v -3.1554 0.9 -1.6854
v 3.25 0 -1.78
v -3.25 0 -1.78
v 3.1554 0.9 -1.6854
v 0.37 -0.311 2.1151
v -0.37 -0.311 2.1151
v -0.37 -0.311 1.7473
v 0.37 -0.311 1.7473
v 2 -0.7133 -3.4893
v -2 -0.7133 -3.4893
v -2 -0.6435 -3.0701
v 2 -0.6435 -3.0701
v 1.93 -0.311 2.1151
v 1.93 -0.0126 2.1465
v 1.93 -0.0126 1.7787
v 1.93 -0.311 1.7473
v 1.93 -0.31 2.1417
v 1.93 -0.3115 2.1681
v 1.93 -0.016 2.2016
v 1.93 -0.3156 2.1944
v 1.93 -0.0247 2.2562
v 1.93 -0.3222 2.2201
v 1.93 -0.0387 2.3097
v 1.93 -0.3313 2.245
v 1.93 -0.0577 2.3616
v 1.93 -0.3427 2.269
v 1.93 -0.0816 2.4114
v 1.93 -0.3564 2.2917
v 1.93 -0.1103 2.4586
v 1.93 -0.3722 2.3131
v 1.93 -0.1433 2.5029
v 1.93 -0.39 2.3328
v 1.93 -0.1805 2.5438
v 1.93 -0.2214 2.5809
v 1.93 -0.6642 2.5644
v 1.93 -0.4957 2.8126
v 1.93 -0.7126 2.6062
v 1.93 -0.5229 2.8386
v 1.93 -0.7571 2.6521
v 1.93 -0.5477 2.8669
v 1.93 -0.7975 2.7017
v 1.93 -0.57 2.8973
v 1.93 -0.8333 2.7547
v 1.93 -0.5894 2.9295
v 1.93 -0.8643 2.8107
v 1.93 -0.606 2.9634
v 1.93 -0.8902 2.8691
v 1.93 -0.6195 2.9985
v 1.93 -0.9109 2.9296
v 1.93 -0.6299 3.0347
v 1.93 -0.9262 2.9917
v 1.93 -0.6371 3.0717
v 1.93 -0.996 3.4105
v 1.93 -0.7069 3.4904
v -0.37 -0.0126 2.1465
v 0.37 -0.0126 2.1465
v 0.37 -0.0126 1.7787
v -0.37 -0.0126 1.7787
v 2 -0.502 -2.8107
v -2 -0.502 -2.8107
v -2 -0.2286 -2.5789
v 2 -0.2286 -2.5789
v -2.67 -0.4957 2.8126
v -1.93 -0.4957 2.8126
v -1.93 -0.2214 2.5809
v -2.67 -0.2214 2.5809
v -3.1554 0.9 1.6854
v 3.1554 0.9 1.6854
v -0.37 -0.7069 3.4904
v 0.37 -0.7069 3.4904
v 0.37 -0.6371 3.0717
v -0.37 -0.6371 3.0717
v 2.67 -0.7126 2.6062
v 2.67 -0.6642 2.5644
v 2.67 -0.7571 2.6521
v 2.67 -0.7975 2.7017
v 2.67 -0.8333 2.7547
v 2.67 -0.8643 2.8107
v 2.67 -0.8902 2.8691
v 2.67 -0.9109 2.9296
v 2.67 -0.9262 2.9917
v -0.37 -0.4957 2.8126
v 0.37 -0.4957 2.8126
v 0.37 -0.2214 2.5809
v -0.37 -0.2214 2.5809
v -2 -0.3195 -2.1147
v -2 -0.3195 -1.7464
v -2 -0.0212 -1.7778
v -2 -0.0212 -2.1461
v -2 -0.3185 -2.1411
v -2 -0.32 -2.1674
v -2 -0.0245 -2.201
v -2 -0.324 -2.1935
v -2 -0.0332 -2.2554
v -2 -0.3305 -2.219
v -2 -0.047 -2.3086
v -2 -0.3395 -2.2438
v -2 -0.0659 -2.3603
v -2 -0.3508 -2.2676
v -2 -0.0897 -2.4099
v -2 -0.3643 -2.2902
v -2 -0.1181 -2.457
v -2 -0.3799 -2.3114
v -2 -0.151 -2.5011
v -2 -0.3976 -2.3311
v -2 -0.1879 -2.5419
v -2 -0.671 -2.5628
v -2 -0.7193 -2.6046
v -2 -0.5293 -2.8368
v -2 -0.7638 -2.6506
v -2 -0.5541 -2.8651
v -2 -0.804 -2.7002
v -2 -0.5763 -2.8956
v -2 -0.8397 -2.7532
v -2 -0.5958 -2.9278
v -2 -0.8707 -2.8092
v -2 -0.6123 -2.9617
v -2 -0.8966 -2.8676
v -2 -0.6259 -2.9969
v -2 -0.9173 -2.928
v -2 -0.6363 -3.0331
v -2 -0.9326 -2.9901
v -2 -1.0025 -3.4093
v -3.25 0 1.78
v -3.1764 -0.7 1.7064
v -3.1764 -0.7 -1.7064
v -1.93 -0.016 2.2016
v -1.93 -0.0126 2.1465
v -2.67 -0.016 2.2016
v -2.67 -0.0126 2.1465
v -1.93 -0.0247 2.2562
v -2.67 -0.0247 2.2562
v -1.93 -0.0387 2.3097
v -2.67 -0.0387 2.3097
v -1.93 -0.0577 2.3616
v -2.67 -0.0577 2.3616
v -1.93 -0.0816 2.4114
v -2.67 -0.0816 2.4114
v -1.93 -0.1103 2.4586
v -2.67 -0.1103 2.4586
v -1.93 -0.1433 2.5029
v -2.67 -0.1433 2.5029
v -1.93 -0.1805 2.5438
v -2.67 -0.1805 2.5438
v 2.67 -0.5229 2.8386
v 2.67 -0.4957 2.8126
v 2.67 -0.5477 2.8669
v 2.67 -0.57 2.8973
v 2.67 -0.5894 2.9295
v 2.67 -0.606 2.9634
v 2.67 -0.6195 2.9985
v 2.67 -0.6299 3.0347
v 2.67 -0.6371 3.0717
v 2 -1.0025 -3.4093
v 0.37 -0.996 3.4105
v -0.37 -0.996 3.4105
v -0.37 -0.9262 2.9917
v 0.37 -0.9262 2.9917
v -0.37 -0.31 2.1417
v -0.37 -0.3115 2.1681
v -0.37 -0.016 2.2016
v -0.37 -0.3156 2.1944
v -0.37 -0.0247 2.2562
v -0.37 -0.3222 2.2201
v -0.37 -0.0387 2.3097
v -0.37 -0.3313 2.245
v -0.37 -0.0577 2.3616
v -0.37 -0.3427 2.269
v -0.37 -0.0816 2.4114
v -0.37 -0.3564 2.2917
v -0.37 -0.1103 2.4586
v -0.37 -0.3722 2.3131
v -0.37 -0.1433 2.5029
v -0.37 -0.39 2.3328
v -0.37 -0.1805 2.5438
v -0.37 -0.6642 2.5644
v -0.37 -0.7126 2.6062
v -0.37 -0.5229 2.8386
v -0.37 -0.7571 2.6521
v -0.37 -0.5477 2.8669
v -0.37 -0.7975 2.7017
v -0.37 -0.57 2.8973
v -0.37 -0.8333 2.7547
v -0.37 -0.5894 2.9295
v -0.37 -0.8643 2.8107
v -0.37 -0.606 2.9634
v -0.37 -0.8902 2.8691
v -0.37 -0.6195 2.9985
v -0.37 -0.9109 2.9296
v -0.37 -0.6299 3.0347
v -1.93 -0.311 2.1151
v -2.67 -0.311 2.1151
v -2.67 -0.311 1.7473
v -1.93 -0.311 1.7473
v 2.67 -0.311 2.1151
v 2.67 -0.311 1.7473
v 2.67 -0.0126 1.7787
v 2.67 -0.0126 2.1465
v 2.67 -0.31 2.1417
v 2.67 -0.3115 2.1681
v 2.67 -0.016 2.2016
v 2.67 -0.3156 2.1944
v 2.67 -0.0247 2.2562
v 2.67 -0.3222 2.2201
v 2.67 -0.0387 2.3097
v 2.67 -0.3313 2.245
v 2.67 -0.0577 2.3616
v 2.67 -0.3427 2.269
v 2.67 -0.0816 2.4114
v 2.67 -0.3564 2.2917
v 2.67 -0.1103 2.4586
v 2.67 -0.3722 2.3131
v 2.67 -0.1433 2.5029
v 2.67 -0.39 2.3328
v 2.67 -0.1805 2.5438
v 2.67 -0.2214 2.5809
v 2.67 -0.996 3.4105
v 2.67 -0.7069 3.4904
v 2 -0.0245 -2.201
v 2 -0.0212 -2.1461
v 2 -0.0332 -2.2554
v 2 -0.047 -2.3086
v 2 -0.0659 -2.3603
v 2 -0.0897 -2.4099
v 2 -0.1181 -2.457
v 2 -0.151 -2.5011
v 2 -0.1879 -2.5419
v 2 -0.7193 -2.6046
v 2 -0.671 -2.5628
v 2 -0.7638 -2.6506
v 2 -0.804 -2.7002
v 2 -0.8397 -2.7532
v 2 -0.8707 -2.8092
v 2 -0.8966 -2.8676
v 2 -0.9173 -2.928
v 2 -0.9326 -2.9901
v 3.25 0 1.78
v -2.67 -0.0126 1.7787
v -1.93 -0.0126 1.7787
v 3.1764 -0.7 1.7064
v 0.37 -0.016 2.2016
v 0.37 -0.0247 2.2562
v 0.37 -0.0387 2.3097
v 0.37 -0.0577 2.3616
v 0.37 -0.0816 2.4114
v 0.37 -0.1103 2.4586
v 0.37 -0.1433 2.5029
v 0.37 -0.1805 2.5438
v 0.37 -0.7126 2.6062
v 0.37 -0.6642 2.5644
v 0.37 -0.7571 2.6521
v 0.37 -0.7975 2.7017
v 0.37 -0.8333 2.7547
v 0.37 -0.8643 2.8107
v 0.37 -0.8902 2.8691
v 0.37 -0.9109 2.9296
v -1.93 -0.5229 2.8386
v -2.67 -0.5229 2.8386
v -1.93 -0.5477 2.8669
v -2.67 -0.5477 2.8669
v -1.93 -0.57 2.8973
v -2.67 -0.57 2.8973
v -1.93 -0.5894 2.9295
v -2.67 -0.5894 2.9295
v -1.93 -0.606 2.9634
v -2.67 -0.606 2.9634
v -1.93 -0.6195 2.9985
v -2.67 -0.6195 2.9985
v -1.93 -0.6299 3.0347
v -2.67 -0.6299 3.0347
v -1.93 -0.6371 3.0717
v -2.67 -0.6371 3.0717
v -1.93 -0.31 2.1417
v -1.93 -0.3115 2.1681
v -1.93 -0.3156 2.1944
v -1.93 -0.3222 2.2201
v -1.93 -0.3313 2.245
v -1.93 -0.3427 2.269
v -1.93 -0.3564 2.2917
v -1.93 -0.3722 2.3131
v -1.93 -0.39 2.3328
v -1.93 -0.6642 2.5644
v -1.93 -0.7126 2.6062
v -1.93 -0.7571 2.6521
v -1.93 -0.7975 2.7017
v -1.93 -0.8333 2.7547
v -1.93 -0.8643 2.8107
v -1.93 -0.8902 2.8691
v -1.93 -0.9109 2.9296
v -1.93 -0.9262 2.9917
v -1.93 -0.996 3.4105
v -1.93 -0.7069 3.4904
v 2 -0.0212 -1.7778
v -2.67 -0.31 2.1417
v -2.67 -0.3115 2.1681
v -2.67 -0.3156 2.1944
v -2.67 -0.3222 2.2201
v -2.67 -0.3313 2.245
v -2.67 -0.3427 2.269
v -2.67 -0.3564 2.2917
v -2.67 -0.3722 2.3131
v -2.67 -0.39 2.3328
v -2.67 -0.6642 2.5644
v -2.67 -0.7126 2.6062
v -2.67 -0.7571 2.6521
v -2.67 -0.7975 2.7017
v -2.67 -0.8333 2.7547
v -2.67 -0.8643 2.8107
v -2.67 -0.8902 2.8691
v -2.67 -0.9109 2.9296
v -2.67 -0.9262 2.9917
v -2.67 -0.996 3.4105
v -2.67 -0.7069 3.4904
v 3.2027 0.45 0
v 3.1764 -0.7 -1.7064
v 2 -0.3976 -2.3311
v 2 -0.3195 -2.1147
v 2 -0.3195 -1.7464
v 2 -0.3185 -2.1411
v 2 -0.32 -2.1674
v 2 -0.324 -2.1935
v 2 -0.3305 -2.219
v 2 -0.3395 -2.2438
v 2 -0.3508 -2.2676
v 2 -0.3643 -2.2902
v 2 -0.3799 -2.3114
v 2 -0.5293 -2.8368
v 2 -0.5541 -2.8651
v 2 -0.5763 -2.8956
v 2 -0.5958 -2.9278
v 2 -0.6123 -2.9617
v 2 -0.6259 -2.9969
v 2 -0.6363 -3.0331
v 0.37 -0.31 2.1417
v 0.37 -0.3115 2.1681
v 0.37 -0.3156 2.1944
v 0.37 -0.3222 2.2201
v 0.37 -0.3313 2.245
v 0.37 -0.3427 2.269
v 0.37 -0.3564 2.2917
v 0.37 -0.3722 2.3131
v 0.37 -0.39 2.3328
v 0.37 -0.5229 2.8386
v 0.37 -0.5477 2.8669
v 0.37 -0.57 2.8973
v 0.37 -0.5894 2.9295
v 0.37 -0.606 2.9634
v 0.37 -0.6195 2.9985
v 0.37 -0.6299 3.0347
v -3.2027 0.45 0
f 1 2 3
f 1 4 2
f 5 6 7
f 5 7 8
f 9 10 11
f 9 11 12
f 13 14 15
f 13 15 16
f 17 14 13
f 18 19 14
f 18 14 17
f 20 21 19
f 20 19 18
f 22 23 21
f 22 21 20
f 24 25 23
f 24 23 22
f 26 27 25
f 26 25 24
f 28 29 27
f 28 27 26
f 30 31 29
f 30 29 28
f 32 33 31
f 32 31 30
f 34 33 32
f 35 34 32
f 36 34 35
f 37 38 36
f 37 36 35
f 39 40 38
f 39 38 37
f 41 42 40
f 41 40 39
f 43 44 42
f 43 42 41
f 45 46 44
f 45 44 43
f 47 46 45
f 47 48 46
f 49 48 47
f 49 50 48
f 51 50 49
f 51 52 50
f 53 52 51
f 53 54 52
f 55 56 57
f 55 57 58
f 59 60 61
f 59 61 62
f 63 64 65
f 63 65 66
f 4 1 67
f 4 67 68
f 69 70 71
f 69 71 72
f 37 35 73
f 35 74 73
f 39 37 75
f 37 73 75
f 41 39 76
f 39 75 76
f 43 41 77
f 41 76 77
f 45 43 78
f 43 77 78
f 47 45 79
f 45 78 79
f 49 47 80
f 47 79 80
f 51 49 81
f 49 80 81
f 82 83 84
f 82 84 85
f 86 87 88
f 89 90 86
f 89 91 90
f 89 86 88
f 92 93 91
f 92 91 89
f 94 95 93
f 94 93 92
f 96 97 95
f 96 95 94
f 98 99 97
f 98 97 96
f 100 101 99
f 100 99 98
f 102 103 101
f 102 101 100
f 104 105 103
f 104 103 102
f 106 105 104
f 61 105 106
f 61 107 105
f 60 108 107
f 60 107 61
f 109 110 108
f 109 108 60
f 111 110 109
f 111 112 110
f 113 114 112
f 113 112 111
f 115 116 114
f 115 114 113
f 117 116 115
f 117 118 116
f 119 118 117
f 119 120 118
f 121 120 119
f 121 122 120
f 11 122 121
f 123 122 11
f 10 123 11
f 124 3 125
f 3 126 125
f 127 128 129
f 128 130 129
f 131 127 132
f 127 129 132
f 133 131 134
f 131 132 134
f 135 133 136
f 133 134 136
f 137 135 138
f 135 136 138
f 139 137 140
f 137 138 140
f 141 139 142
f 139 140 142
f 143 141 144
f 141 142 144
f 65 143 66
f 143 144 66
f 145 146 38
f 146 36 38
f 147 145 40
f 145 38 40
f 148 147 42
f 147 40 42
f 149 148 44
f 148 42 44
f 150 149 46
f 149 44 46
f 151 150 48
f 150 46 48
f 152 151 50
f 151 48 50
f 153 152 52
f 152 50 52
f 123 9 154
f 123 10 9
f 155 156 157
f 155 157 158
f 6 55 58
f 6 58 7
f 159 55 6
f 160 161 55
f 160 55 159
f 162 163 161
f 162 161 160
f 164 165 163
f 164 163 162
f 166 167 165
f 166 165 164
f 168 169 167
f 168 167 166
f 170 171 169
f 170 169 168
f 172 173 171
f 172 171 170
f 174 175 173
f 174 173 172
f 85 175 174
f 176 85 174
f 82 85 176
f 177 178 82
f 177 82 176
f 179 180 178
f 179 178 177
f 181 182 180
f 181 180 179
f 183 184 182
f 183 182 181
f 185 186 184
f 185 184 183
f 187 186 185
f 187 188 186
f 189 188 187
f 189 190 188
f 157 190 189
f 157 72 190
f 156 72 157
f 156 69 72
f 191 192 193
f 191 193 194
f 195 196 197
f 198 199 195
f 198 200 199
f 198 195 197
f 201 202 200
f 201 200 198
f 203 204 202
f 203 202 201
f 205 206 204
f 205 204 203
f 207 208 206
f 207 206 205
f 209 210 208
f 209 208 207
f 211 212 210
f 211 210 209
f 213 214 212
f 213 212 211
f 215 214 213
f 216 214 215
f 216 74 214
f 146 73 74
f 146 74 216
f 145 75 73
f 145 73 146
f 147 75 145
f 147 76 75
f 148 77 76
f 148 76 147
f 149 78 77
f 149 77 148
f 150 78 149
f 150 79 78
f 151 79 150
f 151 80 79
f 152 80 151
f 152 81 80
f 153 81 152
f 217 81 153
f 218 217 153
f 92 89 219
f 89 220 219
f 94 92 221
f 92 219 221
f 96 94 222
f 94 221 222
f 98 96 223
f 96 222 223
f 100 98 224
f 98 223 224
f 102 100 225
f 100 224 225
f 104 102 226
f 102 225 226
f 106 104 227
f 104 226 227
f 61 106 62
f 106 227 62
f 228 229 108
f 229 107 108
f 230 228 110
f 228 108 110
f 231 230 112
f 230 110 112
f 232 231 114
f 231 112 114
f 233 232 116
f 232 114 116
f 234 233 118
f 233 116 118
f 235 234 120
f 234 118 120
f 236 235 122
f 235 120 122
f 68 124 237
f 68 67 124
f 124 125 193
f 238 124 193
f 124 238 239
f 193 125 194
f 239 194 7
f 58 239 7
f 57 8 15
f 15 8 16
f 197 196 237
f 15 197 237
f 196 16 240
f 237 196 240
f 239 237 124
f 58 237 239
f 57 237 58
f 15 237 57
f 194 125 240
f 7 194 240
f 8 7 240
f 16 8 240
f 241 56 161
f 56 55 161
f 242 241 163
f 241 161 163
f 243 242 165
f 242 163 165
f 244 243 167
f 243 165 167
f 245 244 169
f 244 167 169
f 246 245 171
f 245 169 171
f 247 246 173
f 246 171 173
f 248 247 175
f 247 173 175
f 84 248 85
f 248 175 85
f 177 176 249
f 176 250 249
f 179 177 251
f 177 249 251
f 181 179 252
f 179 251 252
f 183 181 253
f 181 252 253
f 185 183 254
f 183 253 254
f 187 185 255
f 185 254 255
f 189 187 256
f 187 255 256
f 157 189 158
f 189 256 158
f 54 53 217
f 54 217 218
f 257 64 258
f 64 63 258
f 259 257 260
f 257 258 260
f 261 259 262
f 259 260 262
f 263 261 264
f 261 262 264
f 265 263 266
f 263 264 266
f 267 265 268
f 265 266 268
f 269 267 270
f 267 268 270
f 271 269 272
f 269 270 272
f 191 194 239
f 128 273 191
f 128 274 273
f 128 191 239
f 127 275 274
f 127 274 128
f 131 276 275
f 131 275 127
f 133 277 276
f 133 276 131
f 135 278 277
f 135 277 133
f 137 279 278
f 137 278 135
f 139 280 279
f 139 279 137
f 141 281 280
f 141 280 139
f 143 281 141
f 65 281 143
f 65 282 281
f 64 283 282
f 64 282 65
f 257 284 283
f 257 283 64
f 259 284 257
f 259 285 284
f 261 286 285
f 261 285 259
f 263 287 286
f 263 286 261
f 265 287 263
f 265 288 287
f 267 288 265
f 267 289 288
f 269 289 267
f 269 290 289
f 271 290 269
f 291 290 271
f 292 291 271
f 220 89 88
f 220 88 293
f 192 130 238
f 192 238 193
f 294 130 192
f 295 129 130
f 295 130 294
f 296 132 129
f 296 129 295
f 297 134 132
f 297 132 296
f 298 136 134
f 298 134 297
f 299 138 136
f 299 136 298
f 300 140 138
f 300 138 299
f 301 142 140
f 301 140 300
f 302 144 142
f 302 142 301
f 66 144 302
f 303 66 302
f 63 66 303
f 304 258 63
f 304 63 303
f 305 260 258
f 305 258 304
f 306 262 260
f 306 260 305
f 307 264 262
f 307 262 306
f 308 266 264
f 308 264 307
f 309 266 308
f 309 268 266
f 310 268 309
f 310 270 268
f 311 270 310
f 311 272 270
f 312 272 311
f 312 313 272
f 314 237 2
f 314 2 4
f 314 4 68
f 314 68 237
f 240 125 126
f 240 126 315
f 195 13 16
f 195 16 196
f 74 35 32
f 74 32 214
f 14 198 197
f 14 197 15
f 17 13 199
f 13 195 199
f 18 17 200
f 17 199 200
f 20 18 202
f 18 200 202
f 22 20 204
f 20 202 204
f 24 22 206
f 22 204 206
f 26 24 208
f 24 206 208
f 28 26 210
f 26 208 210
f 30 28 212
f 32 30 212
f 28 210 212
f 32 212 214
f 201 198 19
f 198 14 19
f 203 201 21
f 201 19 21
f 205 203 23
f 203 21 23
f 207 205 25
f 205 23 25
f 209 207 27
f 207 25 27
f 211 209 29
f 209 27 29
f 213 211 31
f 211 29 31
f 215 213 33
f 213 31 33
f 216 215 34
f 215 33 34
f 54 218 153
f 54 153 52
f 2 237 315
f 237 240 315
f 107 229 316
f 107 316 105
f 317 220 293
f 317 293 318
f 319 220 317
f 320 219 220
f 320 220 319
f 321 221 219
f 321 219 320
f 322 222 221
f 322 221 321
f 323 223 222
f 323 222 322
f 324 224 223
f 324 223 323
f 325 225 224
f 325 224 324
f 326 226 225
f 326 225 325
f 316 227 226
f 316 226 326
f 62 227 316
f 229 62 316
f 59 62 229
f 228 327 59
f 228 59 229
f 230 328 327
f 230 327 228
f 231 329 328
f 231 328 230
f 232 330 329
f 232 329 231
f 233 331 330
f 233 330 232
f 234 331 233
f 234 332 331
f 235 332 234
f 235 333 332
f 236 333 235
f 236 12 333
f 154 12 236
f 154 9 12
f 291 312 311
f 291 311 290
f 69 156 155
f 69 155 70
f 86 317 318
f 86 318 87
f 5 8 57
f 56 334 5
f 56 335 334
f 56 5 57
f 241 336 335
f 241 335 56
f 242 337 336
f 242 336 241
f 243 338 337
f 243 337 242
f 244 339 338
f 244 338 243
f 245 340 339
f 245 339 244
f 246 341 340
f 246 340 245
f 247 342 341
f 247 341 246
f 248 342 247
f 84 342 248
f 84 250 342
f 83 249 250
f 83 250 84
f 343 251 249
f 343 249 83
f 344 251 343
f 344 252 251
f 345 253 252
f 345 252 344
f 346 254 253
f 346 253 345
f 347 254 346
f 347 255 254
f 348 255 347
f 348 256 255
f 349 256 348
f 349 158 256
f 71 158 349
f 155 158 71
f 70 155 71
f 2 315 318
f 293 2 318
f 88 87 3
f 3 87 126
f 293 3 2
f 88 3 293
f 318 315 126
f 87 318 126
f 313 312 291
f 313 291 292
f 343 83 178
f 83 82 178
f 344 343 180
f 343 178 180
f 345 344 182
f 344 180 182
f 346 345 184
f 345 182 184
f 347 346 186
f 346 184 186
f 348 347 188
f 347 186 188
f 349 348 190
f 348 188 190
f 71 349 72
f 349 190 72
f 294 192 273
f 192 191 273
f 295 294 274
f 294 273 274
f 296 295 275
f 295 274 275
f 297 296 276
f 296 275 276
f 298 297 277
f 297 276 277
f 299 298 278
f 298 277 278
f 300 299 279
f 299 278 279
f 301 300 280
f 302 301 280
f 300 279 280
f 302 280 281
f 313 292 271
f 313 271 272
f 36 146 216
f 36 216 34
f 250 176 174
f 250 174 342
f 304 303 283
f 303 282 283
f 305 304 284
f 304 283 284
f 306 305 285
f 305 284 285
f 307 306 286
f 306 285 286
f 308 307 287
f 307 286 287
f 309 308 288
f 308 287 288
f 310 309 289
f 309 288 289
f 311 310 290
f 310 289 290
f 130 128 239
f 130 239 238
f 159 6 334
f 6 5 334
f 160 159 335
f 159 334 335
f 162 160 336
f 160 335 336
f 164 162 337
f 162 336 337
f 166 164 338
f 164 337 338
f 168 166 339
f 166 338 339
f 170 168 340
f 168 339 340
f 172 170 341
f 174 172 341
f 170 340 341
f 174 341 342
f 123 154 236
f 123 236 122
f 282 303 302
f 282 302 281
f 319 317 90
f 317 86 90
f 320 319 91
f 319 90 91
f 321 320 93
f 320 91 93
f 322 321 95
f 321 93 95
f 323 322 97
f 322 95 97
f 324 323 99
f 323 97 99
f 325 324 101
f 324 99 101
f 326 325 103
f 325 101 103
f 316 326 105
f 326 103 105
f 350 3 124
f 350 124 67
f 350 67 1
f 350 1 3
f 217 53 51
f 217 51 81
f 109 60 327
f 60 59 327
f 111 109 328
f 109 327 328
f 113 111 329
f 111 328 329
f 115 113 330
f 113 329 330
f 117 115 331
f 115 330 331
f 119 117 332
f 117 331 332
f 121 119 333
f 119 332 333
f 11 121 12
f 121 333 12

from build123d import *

# Parameters (mm, degrees)
ESBO_O1_W                 = 6.5
ESBO_O1_H                 = 3.56
EXTRUS_O1_DEPTH           = 0.9
EXTRUS_O1_TAPER           = 6
EXTRUS_O1_OTHER_WAY_DEPTH = 0.7
EXTRUS_O1_OTHER_WAY_TAPER = 6
ESBO_O3_W                 = 0.74
ESBO_O3_H                 = 0.3
PADR_O_LINEAR1_COUNT      = 2
PADR_O_LINEAR1_PITCH      = 2.3
PADR_O_LINEAR1_COL_COUNT  = 2
PADR_O_LINEAR1_COL_PITCH  = 2.3
ESBO_O5_W                 = 4
ESBO_O5_H                 = 0.3


with BuildPart() as part:
    # Esboço1 → Extrusão1 (new body)
    with BuildSketch(Plane(origin=(0, 0, 0), x_dir=(1, 0, 0), z_dir=(0, 1, 0))):
        Rectangle(ESBO_O1_W, ESBO_O1_H)
    extrude(amount=EXTRUS_O1_DEPTH, taper=EXTRUS_O1_TAPER)

    # Esboço1 → Extrusão1 other way (add)
    with BuildSketch(Plane(origin=(0, 0, 0), x_dir=(1, 0, 0), z_dir=(0, 1, 0))):
        Rectangle(ESBO_O1_W, ESBO_O1_H)
    extrude(amount=-EXTRUS_O1_OTHER_WAY_DEPTH, taper=EXTRUS_O1_OTHER_WAY_TAPER)

    # Varredura1: sweep along a path in Esboço2
    with BuildLine(Plane(origin=(0, 0, 0), x_dir=(0, 0, -1), z_dir=(1, 0, 0))) as varredura1_path:
        Line((-1.771086264, -0.084808537), (-2.138904869, -0.084808537))
        ThreePointArc((-2.138904869, -0.084808537), (-2.349489276, -0.131317404), (-2.520897515, -0.262191707))
        Line((-2.520897515, -0.262191707), (-2.752531862, -0.536457055))
        ThreePointArc((-2.752531862, -0.536457055), (-2.88725344, -0.648417053), (-3.052325014, -0.707037188))
        Line((-3.052325014, -0.707037188), (-3.471086264, -0.776830729))
    # Esboço3 → Varredura1 (sweep)
    with BuildSketch(Plane(origin=(0, -0.185041405, 1.760551365), x_dir=(1, 0, 0), z_dir=(0, -0.104528463, 0.994521895))):
        with Locations((0, 0.023347308)):
            Rectangle(ESBO_O3_W, ESBO_O3_H)
    varredura1 = sweep(path=varredura1_path.line)

    # Padrão linear1: Varredura1 ×2
    with Locations(*[(i * PADR_O_LINEAR1_PITCH, 0, 0) for i in range(1, PADR_O_LINEAR1_COUNT)]):
        add(varredura1)

    # Padrão linear1 col: Varredura1 ×2
    with Locations(*[(-i * PADR_O_LINEAR1_COL_PITCH, 0, 0) for i in range(1, PADR_O_LINEAR1_COL_COUNT)]):
        add(varredura1)

    # Varredura2: sweep along a path in Esboço4
    with BuildLine(Plane(origin=(0, 0, 0), x_dir=(0, 0, -1), z_dir=(1, 0, 0))) as varredura2_path:
        Line((1.770334988, -0.091956448), (2.13866613, -0.091956448))
        ThreePointArc((2.13866613, -0.091956448), (2.34886791, -0.138287834), (2.52011393, -0.2686956))
        Line((2.52011393, -0.2686956), (2.751853347, -0.542148112))
        ThreePointArc((2.751853347, -0.542148112), (2.886396765, -0.653672528), (3.051101653, -0.712084226))
        Line((3.051101653, -0.712084226), (3.470334988, -0.781956448))
    # Esboço5 → Varredura2 (sweep)
    with BuildSketch(Plane(origin=(0, -0.185041405, -1.760551365), x_dir=(-1, 0, 0), z_dir=(0, -0.104528463, -0.994521895))):
        with Locations((0, 0.014790466)):
            Rectangle(ESBO_O5_W, ESBO_O5_H)
    sweep(path=varredura2_path.line)


solid = part.part
